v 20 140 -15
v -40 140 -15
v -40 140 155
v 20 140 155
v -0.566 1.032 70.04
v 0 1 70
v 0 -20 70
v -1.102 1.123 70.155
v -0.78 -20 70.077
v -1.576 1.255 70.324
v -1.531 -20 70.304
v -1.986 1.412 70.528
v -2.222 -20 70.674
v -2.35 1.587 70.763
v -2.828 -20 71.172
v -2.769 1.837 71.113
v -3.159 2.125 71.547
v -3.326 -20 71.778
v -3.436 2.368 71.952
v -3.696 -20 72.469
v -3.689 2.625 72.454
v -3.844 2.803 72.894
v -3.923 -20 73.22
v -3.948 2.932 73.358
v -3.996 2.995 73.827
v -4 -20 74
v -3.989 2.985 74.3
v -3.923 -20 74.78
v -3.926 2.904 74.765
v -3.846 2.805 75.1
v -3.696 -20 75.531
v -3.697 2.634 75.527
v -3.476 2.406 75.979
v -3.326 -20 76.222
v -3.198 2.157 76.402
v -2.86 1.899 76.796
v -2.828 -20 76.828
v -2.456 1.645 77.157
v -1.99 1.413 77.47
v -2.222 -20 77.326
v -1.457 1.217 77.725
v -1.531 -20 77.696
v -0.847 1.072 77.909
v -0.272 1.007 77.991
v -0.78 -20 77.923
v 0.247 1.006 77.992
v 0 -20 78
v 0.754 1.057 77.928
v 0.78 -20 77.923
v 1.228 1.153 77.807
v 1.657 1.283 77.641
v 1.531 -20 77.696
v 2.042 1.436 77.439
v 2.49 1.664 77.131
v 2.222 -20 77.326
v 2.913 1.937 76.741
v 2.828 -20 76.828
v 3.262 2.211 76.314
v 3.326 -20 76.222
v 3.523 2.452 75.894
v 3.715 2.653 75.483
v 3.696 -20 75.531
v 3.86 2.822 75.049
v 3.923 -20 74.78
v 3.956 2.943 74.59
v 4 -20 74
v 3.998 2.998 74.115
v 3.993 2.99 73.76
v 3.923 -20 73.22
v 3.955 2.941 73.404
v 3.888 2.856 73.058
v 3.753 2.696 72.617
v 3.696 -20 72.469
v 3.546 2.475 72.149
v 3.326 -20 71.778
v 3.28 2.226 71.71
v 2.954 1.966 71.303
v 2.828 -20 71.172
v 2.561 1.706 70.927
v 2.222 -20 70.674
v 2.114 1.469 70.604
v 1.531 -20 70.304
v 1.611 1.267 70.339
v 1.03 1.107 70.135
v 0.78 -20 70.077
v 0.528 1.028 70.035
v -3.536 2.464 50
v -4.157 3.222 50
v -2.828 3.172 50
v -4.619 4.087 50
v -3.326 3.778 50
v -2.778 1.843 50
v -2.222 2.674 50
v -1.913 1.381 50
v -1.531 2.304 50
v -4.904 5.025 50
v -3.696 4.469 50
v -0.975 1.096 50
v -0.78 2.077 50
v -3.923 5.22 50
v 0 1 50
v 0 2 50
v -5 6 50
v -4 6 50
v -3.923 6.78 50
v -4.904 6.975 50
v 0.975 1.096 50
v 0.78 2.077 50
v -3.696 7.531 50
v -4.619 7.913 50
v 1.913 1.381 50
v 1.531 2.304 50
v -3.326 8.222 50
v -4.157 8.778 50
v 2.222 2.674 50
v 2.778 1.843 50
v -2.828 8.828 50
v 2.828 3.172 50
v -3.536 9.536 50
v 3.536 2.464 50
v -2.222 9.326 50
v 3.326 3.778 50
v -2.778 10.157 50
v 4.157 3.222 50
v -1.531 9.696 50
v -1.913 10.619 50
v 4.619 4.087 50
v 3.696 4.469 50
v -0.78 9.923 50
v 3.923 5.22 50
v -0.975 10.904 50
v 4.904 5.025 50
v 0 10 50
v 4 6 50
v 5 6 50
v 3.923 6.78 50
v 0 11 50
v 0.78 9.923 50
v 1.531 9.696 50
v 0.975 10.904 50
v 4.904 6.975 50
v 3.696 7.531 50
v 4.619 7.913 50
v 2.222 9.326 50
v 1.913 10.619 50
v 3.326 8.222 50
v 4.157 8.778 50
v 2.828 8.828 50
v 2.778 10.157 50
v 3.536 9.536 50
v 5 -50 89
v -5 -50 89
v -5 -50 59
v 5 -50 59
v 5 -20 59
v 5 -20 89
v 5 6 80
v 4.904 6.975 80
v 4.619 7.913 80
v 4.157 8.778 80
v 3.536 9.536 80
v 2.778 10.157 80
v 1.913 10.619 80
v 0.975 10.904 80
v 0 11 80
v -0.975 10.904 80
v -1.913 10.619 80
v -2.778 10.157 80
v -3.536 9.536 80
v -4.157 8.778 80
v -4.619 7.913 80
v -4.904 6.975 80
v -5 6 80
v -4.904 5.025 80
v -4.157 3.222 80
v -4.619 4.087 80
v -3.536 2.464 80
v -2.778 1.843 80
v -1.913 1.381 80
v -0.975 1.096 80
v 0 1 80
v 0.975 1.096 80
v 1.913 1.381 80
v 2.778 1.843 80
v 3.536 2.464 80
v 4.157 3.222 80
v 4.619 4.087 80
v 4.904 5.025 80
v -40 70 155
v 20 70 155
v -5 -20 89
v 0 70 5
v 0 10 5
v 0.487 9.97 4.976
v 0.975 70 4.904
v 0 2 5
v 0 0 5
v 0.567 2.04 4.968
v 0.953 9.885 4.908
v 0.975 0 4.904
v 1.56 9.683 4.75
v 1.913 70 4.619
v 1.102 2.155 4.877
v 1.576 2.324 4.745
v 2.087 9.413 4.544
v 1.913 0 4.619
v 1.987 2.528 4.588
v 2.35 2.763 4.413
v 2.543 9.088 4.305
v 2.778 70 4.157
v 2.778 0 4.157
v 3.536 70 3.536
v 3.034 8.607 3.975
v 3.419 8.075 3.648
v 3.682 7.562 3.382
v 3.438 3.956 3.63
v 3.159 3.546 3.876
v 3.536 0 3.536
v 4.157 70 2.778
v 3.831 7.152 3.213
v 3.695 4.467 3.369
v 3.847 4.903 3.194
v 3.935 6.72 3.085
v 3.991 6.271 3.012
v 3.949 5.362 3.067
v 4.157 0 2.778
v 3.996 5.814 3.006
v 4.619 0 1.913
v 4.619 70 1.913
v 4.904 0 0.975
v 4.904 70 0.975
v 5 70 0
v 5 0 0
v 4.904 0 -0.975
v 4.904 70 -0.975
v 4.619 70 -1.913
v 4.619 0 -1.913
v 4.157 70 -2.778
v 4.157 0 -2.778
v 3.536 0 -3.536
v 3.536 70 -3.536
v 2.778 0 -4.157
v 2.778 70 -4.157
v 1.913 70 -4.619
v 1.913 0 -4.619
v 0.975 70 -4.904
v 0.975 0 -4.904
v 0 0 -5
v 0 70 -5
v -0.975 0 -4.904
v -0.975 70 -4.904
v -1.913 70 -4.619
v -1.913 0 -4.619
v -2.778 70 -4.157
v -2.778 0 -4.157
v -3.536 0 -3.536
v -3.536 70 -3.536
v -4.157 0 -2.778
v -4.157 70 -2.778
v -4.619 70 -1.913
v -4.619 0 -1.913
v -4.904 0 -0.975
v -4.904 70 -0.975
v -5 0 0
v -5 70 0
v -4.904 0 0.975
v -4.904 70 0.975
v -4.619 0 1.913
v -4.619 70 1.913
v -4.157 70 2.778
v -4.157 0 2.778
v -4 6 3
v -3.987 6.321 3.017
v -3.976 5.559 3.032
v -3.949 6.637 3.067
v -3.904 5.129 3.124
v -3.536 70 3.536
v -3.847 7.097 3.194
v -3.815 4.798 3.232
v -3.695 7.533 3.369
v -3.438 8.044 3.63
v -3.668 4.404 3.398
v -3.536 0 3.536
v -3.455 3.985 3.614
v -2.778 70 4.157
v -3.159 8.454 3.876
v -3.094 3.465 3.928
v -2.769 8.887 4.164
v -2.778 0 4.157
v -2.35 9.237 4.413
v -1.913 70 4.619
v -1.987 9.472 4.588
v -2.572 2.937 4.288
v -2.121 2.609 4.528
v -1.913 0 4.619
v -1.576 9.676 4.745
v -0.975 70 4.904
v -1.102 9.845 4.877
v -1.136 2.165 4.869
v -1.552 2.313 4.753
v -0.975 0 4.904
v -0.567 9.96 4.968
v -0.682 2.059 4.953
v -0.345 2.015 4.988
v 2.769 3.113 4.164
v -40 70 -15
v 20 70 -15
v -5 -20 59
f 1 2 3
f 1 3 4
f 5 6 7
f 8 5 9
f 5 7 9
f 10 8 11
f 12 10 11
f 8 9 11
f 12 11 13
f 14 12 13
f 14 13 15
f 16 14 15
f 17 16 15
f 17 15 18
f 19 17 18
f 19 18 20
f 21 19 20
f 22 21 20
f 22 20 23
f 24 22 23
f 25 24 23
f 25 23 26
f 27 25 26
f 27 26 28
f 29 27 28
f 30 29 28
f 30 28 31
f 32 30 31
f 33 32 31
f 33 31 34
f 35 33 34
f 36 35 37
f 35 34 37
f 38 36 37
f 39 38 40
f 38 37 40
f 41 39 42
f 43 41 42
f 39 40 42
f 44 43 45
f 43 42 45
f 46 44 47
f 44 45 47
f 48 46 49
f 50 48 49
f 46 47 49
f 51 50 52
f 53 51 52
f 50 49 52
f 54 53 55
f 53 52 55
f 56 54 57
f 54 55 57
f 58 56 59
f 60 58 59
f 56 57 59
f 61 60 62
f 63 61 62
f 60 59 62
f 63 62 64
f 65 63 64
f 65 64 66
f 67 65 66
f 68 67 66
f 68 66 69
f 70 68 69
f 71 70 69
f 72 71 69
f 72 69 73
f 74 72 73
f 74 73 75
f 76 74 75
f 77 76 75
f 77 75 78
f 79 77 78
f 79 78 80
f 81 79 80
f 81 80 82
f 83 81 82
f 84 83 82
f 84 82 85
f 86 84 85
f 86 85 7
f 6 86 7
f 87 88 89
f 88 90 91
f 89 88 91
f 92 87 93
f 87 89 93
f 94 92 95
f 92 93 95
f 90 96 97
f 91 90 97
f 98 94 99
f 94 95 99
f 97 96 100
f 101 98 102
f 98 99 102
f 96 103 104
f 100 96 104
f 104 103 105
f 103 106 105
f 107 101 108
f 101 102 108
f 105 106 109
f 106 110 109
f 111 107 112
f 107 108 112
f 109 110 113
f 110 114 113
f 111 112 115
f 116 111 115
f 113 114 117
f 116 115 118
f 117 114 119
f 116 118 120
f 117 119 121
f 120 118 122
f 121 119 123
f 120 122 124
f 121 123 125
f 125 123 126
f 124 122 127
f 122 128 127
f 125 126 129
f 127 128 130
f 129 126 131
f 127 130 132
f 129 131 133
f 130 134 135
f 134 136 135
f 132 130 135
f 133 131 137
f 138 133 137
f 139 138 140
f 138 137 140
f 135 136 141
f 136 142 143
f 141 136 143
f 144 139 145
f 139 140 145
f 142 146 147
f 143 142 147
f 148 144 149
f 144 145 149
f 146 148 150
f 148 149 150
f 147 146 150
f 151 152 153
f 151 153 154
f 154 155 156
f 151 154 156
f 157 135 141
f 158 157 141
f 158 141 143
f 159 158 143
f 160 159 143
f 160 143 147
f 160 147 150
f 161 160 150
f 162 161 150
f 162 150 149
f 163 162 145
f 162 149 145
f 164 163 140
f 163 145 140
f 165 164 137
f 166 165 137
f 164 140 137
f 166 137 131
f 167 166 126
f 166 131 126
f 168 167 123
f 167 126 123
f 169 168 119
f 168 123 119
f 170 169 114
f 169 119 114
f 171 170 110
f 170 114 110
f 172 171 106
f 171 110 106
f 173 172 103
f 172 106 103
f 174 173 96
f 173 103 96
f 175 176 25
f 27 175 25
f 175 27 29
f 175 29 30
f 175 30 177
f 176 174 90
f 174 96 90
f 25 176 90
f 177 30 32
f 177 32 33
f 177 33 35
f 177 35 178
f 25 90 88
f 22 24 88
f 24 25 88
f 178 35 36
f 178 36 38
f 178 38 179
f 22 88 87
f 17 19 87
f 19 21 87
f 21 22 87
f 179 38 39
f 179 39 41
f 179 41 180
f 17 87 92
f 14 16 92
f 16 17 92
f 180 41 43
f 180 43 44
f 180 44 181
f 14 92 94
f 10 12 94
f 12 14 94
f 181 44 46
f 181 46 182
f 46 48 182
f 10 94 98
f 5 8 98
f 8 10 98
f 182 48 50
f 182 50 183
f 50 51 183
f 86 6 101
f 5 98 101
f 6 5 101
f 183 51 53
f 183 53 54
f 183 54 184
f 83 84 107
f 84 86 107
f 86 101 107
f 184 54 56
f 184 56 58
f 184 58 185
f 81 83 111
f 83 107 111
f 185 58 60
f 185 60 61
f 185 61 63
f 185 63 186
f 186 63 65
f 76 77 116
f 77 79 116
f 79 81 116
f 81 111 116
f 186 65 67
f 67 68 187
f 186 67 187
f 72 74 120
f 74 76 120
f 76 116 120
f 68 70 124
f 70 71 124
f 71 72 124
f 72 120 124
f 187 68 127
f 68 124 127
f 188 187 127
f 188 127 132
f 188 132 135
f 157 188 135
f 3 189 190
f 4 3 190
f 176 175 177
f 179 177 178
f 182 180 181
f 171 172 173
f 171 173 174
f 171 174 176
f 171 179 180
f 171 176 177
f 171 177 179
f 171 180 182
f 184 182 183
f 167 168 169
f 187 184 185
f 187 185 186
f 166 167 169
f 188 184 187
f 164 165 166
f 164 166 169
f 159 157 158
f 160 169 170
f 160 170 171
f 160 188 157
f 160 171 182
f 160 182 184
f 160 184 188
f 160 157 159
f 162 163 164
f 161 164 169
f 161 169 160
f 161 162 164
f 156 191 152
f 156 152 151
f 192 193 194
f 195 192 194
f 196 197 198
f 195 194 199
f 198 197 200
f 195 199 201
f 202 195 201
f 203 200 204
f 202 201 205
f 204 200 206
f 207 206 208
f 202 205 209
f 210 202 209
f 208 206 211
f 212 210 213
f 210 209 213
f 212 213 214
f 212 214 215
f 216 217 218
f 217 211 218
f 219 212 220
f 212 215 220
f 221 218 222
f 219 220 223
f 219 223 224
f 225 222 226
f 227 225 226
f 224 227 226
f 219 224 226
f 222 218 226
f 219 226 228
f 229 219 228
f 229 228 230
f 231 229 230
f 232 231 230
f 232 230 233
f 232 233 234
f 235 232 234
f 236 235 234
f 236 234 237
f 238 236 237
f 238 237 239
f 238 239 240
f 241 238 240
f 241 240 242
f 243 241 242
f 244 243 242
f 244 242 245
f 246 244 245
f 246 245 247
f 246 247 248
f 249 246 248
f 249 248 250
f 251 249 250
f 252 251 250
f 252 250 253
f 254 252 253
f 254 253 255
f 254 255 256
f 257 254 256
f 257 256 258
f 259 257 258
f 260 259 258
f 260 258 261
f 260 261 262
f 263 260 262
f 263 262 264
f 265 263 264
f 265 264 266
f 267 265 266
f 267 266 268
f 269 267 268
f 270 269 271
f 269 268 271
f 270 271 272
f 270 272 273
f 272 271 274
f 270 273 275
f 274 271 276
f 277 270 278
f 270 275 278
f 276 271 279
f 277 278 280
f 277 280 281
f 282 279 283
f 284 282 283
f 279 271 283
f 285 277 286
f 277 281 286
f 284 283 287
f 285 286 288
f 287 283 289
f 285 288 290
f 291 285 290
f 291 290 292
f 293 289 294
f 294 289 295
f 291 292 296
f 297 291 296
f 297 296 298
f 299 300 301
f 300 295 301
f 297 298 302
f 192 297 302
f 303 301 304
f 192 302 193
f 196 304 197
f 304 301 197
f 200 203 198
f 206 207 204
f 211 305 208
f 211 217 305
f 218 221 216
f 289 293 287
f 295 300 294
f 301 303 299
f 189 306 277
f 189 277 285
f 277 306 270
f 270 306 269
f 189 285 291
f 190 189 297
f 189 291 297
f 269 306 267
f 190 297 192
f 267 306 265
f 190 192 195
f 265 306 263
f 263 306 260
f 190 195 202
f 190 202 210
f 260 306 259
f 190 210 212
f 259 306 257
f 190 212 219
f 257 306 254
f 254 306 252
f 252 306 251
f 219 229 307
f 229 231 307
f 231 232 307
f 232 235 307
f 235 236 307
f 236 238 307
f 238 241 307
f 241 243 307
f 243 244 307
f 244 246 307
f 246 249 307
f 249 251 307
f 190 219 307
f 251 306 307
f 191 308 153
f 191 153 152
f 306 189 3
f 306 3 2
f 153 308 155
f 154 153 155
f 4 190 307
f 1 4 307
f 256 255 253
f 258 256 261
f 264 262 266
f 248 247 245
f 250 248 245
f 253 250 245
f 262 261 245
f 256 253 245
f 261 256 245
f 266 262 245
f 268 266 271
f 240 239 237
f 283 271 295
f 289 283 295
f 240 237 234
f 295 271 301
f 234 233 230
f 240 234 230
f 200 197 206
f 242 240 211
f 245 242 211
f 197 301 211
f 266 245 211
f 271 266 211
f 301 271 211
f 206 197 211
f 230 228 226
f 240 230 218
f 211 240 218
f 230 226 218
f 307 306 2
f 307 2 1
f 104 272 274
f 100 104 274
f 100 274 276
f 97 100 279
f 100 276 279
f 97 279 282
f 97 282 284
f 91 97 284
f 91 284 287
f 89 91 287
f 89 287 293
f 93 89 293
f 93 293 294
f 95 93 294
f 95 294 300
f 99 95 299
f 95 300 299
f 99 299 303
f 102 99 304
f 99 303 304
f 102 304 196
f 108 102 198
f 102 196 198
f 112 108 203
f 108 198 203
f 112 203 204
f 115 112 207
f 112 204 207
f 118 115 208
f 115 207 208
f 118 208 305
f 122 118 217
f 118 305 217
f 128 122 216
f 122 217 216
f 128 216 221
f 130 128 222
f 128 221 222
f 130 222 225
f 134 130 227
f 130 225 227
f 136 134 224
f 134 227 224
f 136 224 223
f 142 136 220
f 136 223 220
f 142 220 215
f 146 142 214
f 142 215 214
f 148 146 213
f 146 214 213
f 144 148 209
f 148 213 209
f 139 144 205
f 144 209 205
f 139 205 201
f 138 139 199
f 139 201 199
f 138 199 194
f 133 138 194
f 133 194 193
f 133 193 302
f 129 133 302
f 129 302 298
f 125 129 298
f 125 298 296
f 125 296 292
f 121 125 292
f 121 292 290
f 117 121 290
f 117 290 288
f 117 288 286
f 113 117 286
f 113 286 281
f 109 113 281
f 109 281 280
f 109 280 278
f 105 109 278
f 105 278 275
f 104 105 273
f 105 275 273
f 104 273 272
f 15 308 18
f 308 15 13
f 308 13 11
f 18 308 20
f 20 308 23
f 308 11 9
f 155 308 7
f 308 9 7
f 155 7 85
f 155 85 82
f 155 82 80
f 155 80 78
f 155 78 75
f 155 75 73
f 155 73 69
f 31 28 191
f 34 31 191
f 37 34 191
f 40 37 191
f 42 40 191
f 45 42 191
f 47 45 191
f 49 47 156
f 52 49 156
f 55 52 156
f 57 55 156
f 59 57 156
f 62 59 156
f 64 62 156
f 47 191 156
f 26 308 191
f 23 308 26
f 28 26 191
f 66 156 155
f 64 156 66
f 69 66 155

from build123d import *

# Parameters (mm, degrees)
CROQUIS5_R                   = 5
SALIENTE_EXTRUIR2_DEPTH      = 70
CROQUIS6_R                   = 4
SALIENTE_EXTRUIR3_DEPTH      = 50
CROQUIS7_R                   = 5
SALIENTE_EXTRUIR4_DEPTH      = 30
SALIENTE_EXTRUIR5_DEPTH      = 5
SALIENTE_EXTRUIR5_DEPTH_BACK = 20
CROQUIS8_R                   = 4
CROQUIS10_W                  = 10
CROQUIS10_H                  = 30
SALIENTE_EXTRUIR6_DEPTH      = 30
CROQUIS11_W                  = 60
CROQUIS11_H                  = 170
SALIENTE_EXTRUIR7_DEPTH      = 70


with BuildPart() as part:
    # Croquis5 → Saliente-Extruir2 (new body)
    with BuildSketch(Plane(origin=(0, 0, 0), x_dir=(1, 0, 0), z_dir=(0, 1, 0))):
        with Locations(Location((0, 0, 0), (0, 0, 270))):
            Circle(CROQUIS5_R)
    extrude(amount=SALIENTE_EXTRUIR2_DEPTH)

    # Croquis6 → Saliente-Extruir3 (add)
    with BuildSketch(Plane.XY):
        with Locations(Location((0, 6, 0), (0, 0, 180))):
            Circle(CROQUIS6_R)
    extrude(amount=SALIENTE_EXTRUIR3_DEPTH)

    # Croquis7 → Saliente-Extruir4 (add)
    with BuildSketch(Plane.XY.offset(50)):
        with Locations((0, 6)):
            Circle(CROQUIS7_R)
    extrude(amount=SALIENTE_EXTRUIR4_DEPTH)

    # Croquis8 → Saliente-Extruir5 (add, two sides: drawn at the far end of the back side and taken through both)
    with BuildSketch(Plane(origin=(0, 0, 0), x_dir=(1, 0, 0), z_dir=(0, 1, 0)).offset(-SALIENTE_EXTRUIR5_DEPTH_BACK)):
        with Locations(Location((0, -74, 0), (0, 0, 90))):
            Circle(CROQUIS8_R)
    extrude(amount=SALIENTE_EXTRUIR5_DEPTH + SALIENTE_EXTRUIR5_DEPTH_BACK)

    # Croquis10 → Saliente-Extruir6 (add)
    with BuildSketch(Plane.XZ.offset(20)):
        with Locations((0, 74)):
            Rectangle(CROQUIS10_W, CROQUIS10_H)
    extrude(amount=SALIENTE_EXTRUIR6_DEPTH)

    # Croquis11 → Saliente-Extruir7 (add)
    with BuildSketch(Plane(origin=(0, 70, 0), x_dir=(1, 0, 0), z_dir=(0, 1, 0))):
        with Locations((-10, -70)):
            Rectangle(CROQUIS11_W, CROQUIS11_H)
    extrude(amount=SALIENTE_EXTRUIR7_DEPTH)


solid = part.part
